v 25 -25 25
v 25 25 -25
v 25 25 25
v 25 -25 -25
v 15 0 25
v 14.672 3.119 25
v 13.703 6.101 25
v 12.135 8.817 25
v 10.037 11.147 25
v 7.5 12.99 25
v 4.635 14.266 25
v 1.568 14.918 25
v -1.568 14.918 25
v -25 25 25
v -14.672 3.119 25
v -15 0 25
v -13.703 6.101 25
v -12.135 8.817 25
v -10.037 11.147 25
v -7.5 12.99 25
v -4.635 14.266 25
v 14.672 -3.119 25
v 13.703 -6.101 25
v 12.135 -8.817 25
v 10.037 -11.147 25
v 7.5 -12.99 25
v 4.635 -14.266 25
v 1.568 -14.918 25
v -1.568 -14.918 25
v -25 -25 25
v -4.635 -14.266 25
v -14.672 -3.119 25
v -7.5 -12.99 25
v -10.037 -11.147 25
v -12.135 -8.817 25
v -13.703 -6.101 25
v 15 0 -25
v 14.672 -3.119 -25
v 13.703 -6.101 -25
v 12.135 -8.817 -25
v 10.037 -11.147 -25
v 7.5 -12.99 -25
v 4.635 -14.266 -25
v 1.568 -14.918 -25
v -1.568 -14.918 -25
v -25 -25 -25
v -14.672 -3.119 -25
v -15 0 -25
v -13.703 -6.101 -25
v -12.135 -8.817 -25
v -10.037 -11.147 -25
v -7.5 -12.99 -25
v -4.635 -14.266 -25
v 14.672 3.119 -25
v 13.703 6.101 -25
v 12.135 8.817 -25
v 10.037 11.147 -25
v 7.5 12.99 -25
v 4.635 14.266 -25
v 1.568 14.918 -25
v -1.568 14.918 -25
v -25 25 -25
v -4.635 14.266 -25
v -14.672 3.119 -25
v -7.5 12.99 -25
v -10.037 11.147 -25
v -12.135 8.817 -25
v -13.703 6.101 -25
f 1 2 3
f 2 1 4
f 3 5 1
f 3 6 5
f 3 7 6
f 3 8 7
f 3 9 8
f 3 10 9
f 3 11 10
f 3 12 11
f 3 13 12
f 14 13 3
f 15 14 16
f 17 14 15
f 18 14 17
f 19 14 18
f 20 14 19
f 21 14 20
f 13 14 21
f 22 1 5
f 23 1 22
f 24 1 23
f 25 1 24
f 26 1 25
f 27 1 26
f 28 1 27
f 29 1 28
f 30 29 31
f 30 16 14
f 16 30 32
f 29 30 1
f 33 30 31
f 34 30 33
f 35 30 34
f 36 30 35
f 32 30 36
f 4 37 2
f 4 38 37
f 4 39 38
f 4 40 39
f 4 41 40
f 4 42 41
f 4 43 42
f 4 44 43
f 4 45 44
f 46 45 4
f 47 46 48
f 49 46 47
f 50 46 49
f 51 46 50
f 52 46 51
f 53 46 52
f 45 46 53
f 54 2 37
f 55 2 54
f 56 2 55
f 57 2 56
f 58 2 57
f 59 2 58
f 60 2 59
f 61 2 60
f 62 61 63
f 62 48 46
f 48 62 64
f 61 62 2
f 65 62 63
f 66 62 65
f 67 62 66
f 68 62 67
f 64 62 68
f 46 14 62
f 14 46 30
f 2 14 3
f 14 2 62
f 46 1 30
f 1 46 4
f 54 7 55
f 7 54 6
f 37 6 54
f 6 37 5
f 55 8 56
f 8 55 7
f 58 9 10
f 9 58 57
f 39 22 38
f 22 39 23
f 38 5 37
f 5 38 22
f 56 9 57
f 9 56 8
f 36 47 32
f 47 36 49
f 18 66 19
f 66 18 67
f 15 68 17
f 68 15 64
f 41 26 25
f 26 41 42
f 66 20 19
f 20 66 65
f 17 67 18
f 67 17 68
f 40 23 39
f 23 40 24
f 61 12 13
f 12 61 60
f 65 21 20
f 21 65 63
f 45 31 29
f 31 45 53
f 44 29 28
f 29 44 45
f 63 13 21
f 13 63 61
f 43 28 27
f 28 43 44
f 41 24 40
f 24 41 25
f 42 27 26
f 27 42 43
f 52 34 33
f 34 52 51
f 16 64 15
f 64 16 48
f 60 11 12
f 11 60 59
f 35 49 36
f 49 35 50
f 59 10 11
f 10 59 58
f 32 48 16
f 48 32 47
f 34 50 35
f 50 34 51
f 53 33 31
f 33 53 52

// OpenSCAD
difference()
{
  cube(size=50,center=true);
  cylinder(h = 50, d=30, center = true);
}
